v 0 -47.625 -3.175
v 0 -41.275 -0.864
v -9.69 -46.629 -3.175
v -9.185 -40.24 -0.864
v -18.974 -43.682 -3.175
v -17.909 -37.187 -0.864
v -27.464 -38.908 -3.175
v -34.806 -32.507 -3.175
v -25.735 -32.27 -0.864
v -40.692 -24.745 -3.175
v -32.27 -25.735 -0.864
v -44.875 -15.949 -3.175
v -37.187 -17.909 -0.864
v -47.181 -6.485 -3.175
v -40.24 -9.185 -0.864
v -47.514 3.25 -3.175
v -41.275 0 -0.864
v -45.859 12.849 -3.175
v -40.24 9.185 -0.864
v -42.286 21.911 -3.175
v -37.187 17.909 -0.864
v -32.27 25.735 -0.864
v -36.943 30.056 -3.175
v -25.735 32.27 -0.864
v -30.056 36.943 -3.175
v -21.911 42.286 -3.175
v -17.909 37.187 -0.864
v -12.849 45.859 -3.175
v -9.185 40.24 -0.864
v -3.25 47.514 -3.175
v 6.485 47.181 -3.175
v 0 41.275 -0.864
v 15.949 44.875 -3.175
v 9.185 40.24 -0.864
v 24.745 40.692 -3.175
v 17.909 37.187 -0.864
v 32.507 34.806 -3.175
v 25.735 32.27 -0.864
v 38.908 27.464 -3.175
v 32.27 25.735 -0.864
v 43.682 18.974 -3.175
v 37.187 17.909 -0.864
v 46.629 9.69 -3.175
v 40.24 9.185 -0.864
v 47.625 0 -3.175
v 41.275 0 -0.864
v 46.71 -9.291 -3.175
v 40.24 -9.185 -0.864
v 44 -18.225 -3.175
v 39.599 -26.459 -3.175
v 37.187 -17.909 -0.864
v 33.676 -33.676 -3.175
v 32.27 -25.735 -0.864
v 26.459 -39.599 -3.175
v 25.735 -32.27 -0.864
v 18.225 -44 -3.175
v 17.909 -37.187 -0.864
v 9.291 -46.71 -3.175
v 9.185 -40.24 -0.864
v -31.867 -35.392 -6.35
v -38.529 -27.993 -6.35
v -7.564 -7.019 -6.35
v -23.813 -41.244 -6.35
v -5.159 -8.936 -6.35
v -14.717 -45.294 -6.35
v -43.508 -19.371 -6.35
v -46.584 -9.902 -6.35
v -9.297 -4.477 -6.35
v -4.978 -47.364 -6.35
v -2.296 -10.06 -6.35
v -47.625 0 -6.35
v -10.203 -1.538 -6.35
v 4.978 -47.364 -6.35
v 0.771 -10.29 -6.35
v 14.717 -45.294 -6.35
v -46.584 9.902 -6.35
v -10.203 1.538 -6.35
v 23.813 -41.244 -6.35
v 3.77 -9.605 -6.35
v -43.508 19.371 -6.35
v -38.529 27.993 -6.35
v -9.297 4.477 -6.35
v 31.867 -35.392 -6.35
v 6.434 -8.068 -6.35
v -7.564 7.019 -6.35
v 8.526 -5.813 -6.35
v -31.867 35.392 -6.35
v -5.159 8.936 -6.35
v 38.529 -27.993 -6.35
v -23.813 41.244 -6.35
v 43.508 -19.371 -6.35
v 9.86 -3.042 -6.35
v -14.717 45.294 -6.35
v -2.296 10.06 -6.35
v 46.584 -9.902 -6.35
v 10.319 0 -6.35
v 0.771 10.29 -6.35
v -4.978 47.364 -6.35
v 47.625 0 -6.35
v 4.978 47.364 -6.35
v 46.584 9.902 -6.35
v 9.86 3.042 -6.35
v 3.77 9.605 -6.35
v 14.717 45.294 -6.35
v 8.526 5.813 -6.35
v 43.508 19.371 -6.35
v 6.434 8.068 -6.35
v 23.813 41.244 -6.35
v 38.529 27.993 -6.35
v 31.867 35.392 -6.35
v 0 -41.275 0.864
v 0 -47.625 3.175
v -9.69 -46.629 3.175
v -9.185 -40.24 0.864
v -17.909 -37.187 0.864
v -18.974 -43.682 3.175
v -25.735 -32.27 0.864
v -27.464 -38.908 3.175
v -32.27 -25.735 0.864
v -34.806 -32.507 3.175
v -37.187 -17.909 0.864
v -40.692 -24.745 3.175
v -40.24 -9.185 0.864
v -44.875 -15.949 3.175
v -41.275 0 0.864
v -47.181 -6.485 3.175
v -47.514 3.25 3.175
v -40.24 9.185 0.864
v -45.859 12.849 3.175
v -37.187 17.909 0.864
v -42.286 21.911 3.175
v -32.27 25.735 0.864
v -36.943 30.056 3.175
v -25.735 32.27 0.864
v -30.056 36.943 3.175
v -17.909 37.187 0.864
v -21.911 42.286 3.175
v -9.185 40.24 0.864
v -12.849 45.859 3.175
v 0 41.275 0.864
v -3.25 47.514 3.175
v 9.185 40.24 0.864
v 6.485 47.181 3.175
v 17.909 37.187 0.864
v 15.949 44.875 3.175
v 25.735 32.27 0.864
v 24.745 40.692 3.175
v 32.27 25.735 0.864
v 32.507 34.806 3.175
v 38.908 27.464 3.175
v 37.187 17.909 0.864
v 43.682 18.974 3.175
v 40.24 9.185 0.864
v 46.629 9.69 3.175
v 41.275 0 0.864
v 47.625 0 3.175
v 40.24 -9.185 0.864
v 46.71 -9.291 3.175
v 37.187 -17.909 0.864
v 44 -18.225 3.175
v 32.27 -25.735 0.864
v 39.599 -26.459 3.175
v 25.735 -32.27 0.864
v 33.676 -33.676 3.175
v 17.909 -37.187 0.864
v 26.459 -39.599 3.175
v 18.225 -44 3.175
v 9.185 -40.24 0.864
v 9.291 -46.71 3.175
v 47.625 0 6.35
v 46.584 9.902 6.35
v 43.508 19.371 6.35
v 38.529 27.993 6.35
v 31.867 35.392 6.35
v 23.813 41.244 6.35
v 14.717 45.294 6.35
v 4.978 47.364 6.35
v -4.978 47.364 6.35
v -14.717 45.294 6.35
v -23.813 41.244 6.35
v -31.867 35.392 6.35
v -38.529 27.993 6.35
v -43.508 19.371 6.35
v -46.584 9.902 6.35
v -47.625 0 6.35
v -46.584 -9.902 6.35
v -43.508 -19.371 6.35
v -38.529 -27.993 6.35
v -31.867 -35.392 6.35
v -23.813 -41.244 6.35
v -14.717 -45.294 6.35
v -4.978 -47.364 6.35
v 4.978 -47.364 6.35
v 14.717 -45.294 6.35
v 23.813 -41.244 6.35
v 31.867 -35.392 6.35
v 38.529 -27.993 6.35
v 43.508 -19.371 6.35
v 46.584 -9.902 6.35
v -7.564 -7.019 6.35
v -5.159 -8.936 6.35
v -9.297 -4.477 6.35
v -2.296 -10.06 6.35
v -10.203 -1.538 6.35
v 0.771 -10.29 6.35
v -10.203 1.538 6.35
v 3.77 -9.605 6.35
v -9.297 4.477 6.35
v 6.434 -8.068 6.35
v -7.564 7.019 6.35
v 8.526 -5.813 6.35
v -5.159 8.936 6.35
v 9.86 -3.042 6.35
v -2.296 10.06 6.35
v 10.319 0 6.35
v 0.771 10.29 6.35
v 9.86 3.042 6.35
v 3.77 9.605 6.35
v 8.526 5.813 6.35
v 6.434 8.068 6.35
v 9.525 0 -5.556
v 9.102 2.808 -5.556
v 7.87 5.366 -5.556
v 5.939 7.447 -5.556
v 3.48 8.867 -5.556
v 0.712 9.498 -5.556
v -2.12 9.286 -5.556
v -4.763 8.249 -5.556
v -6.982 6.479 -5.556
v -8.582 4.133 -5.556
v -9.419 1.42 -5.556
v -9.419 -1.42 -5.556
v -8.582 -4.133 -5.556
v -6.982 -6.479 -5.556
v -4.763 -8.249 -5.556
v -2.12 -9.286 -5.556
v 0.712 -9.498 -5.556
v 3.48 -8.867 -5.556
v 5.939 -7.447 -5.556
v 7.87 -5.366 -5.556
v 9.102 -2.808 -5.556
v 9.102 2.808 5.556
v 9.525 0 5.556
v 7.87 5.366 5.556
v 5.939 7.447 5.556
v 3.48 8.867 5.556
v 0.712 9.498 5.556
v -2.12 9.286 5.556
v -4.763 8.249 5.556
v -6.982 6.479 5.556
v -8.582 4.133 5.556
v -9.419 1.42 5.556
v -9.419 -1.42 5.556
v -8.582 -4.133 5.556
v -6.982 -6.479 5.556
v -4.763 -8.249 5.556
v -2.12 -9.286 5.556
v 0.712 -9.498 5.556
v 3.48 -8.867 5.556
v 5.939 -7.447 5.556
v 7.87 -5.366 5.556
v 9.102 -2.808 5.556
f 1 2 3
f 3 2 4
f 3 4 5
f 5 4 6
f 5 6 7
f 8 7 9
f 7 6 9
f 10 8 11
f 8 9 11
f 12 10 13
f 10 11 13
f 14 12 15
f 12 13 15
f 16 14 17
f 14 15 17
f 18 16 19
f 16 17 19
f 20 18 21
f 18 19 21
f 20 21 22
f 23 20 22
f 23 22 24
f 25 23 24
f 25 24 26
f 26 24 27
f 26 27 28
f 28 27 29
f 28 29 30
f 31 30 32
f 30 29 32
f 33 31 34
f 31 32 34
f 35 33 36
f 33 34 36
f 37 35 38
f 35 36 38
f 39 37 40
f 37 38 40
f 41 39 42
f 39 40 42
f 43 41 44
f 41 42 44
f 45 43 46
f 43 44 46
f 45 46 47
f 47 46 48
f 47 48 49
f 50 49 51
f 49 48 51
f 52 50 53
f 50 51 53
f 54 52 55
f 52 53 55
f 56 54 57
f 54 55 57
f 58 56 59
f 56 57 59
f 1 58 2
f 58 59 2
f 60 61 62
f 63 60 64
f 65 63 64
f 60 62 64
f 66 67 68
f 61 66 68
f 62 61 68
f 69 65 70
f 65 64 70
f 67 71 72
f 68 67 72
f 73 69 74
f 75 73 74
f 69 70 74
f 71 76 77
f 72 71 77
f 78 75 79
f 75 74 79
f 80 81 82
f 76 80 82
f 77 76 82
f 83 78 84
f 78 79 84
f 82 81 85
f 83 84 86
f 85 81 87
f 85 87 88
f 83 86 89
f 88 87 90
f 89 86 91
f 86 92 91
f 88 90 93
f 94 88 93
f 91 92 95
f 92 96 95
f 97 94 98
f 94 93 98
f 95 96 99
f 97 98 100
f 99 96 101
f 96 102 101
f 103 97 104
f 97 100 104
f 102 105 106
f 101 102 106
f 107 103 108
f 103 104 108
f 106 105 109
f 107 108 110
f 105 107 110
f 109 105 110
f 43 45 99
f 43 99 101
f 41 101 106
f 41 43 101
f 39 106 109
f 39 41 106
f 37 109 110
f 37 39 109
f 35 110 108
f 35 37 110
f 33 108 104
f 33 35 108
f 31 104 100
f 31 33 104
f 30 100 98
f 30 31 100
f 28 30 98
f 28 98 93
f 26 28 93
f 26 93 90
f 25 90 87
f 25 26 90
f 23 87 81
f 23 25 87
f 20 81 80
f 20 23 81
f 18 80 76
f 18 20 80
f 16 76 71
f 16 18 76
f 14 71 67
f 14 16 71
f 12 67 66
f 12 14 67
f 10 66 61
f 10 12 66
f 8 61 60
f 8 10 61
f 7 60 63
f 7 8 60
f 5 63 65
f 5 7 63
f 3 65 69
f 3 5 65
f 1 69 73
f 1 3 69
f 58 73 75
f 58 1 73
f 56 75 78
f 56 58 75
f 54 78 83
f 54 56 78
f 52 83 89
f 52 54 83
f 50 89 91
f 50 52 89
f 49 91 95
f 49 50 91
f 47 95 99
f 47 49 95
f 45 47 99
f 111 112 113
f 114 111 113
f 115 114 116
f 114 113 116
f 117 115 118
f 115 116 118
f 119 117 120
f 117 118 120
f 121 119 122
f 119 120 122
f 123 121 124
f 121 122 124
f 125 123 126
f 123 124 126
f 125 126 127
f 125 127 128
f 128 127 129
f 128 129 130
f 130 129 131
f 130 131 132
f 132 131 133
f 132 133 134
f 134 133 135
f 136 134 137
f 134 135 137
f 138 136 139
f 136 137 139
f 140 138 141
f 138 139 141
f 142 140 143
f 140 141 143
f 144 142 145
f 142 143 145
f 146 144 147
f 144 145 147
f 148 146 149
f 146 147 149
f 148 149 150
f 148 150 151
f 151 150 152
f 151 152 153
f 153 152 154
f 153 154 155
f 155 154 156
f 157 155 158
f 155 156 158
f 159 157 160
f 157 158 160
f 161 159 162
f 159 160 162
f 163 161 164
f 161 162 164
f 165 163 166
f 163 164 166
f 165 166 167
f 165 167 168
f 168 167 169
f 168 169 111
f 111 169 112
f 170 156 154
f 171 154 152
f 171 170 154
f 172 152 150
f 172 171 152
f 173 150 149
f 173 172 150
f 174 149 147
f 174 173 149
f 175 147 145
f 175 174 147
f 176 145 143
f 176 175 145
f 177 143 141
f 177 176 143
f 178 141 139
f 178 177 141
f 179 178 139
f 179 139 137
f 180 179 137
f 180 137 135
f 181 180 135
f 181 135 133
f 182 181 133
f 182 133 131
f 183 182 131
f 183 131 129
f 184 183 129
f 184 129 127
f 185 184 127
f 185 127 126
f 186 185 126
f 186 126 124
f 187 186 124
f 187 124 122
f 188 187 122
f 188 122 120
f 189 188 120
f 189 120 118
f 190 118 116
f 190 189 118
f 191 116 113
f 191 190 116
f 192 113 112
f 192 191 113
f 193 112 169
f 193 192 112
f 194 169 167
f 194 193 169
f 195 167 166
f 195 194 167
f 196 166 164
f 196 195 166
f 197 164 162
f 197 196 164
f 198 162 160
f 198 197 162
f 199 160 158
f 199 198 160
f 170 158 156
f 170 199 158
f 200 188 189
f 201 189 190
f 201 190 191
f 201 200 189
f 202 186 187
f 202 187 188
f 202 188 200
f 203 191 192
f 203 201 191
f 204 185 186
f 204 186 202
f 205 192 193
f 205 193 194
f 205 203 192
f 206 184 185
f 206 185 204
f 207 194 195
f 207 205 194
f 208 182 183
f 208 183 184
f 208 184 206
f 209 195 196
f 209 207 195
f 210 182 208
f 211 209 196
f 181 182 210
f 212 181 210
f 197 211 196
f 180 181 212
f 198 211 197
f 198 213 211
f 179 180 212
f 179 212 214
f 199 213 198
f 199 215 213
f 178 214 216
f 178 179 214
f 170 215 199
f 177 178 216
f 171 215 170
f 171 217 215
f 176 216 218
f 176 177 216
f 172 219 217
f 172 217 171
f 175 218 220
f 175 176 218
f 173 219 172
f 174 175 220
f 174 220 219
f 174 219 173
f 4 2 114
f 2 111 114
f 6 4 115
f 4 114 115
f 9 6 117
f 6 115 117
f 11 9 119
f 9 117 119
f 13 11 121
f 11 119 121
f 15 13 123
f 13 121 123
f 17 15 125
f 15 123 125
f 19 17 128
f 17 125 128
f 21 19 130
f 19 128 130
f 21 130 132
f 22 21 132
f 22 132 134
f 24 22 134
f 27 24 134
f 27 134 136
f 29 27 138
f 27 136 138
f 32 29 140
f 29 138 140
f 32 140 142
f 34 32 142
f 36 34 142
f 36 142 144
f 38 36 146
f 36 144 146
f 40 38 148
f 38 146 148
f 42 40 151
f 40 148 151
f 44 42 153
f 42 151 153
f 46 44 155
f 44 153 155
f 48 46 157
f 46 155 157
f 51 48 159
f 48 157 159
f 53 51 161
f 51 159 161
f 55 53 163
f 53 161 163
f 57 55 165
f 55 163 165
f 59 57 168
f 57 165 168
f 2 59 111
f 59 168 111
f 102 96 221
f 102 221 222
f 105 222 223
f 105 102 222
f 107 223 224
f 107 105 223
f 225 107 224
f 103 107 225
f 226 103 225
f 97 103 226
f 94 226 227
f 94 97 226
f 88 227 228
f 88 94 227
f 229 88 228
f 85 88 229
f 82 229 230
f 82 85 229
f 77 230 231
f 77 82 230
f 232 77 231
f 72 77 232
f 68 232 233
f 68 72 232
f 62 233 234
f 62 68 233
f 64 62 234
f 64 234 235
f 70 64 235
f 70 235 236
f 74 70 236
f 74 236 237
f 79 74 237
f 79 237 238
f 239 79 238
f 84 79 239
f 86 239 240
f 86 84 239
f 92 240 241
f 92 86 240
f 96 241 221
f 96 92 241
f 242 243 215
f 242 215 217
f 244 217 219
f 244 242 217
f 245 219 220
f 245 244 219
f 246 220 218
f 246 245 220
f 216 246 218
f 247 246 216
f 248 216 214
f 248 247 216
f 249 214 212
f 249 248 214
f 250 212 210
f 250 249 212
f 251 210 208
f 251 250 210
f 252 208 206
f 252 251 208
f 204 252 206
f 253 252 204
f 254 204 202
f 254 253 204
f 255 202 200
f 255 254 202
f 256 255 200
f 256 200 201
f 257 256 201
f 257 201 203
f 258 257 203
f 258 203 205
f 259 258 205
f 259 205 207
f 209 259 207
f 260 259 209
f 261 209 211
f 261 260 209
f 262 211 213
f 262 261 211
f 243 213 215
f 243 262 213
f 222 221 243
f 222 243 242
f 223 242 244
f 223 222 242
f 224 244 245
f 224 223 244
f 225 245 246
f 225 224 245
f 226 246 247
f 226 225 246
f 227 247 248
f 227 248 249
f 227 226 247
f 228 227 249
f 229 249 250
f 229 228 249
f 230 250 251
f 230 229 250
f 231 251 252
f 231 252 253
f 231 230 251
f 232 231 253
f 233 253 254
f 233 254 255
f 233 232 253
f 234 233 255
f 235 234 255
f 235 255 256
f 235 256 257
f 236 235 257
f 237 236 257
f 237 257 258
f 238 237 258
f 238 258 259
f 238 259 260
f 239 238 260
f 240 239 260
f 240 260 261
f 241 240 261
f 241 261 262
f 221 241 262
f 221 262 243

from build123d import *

# Parameters (mm, degrees)
SKETCH1_R      = 47.625
SKETCH1_R_2    = 9.525
EXTRUDE1_DEPTH = 6.35
CHAMFER1_SIZE  = 0.79375


with BuildPart() as part:
    # Sketch1 → Extrude1 (new, symmetric)
    with BuildSketch(Plane.XY):
        Circle(SKETCH1_R)
        Circle(SKETCH1_R_2, mode=Mode.SUBTRACT)
    extrude(amount=EXTRUDE1_DEPTH, both=True)

    # Chamfer1
    chamfer1_edges = [part.edges().sort_by_distance(p)[0] for p in [
        (-9.525, 0, -6.35),
        (-9.525, 0, 6.35),
    ]]
    chamfer(chamfer1_edges, length=CHAMFER1_SIZE)

    # Sketch2 → Cut-Revolve1 (revolve, cut)
    with BuildSketch(Plane(origin=(0, 0, 0), x_dir=(0, 0, -1), z_dir=(1, 0, 0)), mode=Mode.PRIVATE) as cut_revolve1_sk:
        Polygon((-3.175, 47.625), (3.175, 47.625), (0.863789012, 41.275), (-0.863789012, 41.275), align=None)
    revolve(cut_revolve1_sk.sketch.rotate(Axis((0, 0, 6.35), (0, 0, -1)), 180), axis=Axis((0, 0, 6.35), (0, 0, -1)), mode=Mode.SUBTRACT)


solid = part.part
